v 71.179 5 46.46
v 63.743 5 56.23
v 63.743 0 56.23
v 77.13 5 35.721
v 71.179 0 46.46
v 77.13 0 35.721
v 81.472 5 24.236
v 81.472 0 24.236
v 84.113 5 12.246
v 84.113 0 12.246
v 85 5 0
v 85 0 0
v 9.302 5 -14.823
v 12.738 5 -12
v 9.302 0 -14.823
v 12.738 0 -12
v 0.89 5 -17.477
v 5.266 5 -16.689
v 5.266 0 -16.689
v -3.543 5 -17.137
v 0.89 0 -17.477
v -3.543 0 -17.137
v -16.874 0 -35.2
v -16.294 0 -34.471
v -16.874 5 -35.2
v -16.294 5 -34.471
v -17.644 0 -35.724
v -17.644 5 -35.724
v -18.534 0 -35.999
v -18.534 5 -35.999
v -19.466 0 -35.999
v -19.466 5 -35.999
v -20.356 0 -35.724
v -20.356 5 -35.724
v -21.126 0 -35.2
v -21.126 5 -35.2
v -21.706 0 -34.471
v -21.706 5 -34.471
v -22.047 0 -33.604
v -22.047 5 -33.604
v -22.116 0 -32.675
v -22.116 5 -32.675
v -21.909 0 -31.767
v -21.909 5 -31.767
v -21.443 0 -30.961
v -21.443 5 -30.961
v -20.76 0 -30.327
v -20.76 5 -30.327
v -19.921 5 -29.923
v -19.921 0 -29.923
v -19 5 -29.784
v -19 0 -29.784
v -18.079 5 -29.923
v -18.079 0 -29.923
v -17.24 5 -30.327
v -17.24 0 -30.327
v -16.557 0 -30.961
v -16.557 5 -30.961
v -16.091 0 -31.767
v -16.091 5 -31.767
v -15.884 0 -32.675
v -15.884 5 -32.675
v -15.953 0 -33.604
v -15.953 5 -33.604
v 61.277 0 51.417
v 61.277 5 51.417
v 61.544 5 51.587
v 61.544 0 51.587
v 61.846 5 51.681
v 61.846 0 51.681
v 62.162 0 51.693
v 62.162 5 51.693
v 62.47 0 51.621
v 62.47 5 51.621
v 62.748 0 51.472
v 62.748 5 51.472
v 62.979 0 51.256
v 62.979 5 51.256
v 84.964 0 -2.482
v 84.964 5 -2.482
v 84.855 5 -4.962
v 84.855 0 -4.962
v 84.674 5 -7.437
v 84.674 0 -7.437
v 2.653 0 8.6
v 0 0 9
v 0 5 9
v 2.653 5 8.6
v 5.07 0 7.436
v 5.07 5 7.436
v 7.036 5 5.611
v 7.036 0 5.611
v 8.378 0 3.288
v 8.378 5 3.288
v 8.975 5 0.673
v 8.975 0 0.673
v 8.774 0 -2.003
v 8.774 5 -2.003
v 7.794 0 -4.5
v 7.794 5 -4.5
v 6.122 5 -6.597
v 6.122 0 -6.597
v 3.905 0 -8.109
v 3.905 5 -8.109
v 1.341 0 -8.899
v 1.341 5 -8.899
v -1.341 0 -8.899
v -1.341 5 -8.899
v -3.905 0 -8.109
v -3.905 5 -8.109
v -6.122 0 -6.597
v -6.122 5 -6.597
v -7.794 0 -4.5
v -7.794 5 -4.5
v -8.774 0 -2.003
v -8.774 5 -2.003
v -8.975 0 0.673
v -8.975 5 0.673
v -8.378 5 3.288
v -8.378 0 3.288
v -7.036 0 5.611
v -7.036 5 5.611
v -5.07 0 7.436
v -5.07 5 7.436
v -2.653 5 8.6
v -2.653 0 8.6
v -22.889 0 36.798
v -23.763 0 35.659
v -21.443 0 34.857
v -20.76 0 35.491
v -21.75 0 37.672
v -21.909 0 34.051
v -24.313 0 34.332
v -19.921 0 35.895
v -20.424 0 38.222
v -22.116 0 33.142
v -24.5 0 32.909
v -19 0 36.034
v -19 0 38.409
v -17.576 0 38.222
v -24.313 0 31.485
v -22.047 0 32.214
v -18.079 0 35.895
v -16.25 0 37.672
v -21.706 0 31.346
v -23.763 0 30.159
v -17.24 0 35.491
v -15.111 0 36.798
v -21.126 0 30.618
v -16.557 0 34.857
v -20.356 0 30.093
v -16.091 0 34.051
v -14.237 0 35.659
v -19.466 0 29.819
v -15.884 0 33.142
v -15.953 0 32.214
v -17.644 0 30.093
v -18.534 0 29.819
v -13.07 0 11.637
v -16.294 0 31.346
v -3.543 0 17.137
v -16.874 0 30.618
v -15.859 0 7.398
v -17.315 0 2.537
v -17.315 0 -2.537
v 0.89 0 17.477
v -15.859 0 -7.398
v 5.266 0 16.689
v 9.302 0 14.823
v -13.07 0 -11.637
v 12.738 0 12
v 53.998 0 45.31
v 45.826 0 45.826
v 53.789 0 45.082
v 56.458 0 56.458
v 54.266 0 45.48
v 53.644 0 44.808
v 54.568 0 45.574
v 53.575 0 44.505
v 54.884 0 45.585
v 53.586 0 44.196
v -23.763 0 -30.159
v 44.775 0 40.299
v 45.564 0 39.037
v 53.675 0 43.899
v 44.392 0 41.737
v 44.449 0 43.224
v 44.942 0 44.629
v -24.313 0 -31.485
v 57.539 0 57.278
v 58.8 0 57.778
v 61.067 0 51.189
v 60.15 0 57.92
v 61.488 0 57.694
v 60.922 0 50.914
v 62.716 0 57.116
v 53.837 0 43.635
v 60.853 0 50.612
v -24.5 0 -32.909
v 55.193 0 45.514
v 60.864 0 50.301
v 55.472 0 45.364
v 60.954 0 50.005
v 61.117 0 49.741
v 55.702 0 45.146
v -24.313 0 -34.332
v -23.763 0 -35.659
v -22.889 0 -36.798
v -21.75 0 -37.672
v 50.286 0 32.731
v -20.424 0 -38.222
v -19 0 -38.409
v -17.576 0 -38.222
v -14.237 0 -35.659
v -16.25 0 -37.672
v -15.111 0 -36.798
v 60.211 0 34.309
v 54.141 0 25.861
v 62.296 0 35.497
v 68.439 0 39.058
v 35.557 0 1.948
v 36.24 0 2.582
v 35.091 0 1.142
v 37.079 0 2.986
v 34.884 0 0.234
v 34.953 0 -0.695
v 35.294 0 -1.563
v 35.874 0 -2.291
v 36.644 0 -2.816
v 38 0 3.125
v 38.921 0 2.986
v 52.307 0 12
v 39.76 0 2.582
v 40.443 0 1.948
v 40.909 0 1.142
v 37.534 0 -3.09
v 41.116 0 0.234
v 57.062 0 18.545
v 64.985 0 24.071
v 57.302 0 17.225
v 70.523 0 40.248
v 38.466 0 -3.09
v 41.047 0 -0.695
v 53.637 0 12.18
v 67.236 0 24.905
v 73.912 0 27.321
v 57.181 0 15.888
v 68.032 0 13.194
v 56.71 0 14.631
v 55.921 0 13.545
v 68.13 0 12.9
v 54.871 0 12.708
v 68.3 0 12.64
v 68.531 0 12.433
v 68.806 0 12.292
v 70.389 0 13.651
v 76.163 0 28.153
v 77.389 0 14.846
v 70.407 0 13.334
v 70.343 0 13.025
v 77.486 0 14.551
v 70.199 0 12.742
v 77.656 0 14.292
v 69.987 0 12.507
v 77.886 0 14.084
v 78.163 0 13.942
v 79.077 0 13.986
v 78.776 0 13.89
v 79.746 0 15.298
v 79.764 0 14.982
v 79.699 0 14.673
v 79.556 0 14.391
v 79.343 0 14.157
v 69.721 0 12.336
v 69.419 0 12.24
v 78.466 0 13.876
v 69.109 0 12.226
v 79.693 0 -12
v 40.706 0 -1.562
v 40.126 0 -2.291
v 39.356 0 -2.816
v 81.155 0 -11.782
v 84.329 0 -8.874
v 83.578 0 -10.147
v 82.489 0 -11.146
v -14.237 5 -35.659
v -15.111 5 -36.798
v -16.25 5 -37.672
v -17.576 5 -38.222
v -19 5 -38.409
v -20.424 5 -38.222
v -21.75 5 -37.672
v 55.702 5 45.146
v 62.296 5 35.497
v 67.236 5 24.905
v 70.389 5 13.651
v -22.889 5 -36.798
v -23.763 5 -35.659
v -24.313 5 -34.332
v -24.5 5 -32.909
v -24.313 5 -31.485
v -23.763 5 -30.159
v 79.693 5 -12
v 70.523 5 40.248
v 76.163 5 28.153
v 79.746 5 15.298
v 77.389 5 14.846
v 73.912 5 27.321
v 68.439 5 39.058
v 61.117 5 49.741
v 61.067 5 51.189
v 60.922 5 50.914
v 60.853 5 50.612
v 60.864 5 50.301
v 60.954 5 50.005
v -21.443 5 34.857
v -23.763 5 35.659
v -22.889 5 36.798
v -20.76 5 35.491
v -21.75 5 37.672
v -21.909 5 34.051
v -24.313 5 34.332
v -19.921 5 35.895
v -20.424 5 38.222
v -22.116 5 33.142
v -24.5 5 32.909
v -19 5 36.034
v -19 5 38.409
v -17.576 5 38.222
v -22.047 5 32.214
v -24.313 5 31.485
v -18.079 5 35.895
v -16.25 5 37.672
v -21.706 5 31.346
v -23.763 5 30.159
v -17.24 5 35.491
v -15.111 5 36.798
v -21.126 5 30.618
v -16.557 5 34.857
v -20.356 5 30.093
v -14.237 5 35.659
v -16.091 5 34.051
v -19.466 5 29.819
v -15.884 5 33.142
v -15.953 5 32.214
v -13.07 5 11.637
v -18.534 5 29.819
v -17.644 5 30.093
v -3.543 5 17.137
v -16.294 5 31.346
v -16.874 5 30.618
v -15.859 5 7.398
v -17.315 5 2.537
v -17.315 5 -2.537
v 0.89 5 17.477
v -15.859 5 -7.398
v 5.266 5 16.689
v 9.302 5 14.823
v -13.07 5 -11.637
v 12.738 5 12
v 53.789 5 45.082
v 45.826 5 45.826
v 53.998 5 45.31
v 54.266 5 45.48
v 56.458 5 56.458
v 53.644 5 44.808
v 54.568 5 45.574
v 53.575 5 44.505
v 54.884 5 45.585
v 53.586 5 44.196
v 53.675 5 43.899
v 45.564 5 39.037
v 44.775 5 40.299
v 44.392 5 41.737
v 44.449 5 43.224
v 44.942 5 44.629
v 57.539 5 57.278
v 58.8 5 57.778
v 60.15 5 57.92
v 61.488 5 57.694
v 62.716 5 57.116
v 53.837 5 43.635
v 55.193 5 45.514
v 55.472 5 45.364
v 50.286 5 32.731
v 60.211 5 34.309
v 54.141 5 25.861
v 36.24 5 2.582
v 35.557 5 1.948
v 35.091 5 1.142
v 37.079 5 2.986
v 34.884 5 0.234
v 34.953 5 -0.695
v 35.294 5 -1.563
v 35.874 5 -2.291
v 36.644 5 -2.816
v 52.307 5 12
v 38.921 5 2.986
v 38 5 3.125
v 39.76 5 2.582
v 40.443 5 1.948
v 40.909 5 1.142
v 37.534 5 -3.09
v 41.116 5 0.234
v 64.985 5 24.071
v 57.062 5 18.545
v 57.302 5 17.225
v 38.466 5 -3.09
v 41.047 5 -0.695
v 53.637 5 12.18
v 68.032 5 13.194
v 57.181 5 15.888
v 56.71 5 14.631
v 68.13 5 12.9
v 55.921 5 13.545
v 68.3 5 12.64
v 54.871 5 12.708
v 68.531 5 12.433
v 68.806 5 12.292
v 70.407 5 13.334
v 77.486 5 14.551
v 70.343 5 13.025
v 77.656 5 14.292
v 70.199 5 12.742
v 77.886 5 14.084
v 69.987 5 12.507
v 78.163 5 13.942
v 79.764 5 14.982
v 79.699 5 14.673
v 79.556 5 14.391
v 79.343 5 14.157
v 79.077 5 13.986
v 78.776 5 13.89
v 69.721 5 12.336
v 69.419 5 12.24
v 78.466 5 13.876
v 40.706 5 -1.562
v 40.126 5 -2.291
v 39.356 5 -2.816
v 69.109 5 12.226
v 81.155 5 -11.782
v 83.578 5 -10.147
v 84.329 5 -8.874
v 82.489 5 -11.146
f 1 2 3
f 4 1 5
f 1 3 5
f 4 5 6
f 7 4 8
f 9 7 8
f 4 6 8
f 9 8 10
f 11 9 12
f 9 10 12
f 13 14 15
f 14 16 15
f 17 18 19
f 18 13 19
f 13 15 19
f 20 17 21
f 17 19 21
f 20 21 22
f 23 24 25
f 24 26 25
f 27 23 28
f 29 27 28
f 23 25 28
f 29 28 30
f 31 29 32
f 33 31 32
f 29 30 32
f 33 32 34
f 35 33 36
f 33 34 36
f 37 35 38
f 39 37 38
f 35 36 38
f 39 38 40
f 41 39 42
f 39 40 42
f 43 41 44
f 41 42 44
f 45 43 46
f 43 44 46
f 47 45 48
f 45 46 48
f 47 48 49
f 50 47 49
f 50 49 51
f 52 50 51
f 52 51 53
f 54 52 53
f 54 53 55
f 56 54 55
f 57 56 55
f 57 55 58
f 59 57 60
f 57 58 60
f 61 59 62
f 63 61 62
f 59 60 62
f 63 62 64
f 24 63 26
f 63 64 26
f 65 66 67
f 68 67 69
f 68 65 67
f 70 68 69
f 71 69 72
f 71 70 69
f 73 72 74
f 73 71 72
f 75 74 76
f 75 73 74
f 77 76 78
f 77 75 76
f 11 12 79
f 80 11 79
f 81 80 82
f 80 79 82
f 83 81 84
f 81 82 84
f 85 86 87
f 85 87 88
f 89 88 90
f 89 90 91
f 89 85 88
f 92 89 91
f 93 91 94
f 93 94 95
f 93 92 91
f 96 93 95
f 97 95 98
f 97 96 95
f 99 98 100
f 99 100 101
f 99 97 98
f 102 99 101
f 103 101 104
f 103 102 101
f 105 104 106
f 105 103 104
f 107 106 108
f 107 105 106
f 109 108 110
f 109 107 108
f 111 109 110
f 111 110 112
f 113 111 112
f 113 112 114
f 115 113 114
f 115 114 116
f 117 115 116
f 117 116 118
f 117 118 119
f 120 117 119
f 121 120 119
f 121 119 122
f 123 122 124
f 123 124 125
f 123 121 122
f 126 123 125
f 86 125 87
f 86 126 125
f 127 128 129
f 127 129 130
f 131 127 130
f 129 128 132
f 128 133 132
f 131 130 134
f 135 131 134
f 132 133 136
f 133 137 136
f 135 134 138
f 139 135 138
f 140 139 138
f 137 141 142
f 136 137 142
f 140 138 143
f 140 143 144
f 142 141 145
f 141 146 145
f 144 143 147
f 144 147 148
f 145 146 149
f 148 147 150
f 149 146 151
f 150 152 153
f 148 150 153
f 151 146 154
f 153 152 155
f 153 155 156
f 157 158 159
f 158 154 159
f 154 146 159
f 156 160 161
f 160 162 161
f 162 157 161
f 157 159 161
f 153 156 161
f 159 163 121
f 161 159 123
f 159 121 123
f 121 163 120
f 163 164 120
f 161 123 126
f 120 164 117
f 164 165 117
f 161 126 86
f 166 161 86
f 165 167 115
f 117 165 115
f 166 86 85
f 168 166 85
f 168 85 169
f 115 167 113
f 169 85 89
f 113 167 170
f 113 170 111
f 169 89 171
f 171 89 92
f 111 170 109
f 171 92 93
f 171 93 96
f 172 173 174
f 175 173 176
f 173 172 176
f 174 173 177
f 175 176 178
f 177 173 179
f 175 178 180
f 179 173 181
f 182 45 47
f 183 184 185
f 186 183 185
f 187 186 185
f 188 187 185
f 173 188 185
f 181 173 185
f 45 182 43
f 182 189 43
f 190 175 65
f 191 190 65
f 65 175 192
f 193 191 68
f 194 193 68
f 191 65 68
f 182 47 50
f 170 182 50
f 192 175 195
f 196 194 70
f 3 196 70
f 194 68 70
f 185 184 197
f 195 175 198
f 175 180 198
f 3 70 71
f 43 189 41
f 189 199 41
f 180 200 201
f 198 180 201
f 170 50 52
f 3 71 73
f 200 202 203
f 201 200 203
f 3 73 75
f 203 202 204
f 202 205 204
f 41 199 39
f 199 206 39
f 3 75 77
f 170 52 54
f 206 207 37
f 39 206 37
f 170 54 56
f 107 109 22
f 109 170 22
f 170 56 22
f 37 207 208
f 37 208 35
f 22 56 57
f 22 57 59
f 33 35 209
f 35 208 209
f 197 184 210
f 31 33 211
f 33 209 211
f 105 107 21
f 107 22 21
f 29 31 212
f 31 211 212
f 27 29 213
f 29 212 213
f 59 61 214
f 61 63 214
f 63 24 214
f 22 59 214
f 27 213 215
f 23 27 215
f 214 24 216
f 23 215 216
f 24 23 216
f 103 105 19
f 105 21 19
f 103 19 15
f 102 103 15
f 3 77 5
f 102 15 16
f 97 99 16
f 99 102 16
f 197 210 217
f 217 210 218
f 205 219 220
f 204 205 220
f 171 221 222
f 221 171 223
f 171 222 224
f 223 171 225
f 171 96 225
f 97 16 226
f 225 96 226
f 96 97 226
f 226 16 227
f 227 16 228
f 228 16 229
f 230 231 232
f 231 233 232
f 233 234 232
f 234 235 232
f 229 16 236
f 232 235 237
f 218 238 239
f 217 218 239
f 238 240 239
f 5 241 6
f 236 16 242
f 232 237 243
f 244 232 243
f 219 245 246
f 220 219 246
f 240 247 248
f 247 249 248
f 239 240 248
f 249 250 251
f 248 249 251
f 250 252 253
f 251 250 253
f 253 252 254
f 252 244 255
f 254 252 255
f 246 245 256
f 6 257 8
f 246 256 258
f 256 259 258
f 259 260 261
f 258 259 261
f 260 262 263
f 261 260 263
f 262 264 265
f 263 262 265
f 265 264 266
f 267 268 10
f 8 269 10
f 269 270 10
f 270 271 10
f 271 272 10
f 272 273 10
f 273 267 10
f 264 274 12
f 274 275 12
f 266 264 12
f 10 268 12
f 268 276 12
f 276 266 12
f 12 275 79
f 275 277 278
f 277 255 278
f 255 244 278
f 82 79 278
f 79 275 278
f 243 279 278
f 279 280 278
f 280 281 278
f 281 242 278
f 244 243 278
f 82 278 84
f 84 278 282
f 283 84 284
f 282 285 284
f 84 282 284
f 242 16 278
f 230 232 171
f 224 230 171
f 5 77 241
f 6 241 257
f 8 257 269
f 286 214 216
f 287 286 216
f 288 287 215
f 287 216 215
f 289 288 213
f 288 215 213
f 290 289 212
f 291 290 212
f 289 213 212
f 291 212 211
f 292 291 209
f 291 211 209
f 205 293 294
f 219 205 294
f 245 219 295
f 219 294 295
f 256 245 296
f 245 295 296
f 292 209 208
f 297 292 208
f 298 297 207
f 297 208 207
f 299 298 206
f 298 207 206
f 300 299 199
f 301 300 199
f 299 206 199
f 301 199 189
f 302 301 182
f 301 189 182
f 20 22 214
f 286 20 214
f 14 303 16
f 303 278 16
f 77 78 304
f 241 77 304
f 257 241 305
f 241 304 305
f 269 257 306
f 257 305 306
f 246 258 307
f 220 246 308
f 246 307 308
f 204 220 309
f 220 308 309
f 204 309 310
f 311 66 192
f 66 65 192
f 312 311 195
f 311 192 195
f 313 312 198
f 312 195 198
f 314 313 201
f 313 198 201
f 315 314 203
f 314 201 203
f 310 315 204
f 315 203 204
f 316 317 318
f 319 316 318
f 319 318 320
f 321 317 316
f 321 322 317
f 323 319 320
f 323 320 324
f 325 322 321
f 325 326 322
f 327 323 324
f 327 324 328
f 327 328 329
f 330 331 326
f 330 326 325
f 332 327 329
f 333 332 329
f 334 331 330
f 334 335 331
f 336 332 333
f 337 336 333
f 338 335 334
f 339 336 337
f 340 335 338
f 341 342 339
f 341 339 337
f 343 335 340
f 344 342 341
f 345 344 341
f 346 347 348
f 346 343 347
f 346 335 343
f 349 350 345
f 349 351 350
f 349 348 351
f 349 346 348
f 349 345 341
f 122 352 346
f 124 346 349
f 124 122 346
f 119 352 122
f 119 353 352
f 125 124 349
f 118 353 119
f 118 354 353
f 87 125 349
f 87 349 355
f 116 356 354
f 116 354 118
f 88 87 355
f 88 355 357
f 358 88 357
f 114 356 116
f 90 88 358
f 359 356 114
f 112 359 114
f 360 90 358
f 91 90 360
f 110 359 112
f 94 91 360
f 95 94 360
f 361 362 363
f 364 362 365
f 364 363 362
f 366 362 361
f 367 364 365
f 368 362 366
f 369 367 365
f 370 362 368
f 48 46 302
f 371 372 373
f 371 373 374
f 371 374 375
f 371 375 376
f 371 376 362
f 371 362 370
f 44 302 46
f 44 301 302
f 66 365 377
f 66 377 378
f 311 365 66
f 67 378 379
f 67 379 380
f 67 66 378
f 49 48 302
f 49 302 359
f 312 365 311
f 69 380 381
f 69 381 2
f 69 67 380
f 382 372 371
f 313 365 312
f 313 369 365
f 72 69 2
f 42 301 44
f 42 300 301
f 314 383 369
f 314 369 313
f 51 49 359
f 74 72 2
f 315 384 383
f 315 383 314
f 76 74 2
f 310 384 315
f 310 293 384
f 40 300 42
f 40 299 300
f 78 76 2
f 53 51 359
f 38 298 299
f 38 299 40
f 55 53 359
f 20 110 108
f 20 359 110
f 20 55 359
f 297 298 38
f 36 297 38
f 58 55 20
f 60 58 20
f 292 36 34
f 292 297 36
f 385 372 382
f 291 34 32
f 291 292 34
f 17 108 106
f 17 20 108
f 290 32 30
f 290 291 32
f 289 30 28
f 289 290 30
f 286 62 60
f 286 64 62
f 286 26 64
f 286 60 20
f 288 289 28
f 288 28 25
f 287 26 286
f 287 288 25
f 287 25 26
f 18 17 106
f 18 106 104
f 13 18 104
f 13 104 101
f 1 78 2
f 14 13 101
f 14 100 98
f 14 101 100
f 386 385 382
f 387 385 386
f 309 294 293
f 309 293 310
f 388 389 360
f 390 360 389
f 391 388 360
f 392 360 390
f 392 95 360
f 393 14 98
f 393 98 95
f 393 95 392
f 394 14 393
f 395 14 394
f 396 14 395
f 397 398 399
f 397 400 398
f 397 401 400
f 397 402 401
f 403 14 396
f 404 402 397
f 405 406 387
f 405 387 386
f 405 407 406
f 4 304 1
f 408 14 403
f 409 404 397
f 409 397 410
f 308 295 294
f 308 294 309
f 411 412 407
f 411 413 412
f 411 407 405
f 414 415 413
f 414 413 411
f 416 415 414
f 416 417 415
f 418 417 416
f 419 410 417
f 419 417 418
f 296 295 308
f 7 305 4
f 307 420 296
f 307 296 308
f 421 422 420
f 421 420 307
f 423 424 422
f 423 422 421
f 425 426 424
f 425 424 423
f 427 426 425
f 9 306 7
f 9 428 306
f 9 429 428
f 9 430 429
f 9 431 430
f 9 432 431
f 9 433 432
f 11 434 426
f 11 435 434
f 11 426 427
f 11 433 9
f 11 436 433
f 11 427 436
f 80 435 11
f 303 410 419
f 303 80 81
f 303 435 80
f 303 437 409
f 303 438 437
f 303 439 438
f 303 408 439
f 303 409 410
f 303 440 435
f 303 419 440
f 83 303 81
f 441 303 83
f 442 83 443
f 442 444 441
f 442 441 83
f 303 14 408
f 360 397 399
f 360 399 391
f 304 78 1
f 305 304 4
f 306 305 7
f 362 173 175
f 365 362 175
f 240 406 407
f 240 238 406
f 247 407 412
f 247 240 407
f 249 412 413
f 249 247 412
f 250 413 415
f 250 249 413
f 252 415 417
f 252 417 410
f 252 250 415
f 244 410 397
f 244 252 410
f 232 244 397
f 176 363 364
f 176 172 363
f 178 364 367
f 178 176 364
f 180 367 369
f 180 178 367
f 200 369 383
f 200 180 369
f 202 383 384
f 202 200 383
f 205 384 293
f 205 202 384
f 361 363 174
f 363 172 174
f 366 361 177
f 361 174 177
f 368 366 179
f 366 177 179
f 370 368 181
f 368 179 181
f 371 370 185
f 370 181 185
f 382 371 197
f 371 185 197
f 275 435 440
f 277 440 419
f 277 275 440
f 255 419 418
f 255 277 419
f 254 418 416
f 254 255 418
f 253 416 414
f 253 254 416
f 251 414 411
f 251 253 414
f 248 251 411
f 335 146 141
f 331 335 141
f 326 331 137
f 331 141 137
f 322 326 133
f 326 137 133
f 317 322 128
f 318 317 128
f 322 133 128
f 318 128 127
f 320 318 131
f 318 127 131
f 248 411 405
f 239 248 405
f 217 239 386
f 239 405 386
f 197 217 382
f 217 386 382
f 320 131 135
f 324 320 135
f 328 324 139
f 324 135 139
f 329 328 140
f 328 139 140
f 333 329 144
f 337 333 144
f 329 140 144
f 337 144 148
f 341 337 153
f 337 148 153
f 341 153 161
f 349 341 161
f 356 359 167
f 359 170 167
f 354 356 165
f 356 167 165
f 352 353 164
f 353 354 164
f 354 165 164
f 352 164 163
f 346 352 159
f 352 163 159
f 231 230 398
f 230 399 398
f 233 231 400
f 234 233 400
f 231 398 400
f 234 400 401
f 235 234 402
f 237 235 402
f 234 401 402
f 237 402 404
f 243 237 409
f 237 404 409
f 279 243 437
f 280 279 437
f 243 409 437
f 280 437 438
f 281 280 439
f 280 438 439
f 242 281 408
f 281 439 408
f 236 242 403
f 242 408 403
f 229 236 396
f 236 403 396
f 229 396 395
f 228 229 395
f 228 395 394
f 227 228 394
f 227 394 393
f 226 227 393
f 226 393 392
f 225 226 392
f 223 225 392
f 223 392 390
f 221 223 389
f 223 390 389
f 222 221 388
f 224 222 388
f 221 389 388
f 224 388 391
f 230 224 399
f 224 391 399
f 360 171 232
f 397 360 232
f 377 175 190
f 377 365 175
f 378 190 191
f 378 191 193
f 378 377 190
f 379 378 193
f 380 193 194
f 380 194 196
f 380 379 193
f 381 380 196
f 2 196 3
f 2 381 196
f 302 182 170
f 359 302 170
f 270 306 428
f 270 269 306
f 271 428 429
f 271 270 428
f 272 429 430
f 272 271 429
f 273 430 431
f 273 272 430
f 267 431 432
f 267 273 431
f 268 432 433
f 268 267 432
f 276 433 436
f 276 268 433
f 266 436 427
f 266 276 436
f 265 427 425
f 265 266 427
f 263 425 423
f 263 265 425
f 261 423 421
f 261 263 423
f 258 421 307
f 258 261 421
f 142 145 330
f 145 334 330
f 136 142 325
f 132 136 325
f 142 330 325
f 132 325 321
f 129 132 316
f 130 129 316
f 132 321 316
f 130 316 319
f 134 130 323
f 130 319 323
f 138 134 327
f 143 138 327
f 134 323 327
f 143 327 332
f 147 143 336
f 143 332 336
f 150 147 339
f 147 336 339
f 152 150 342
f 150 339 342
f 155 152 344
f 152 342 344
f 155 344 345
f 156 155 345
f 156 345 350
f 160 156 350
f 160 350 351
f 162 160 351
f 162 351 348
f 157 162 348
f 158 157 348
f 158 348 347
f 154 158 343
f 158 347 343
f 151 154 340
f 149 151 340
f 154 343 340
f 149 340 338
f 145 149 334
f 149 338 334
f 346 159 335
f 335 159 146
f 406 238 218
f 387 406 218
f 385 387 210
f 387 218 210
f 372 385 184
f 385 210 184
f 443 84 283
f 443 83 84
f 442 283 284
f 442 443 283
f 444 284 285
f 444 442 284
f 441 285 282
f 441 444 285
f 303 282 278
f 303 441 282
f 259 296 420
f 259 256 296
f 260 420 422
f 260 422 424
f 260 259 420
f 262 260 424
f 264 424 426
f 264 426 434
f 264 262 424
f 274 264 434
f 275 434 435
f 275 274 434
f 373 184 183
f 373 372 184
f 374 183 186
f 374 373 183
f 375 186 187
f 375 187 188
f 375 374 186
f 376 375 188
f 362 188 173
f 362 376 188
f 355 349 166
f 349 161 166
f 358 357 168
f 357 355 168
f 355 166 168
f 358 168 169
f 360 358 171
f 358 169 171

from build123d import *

# Parameters (mm, degrees)
SKETCH1_R               = 17.5
SKETCH1_R_2             = 9
BOSS_EXTRUDE1_DEPTH     = 5
BOSS_EXTRUDE3_DEPTH     = 5
SKETCH6_W               = 47.262260797
SKETCH6_H               = 24
BOSS_EXTRUDE4_DEPTH     = 5
SKETCH4_R               = 3.125
CUT_EXTRUDE1_DEPTH      = 63.69968102
CIRPATTERN1_COUNT       = 3
BOSS_EXTRUDE5_DEPTH     = 5
CUT_EXTRUDE_THIN1_DEPTH = 10
FILLET1_R               = 1.2
FILLET2_R               = 5


with BuildPart() as part:
    # Sketch1 → Boss-Extrude1 (new body)
    with BuildSketch(Plane(origin=(0, 0, 0), x_dir=(1, 0, 0), z_dir=(0, 1, 0))):
        with Locations(Location((0, 0, 0), (0, 0, 270))):
            Circle(SKETCH1_R)
        with Locations(Location((0, 0, 0), (0, 0, 270))):
            Circle(SKETCH1_R_2, mode=Mode.SUBTRACT)
    extrude(amount=BOSS_EXTRUDE1_DEPTH)

    # Sketch3 → Boss-Extrude3 (add)
    with BuildSketch(Plane(origin=(0, 0, 0), x_dir=(1, 0, 0), z_dir=(0, 1, 0))):
        with BuildLine():
            Line((38, 5.5), (10.009906254, 5.5))
            Line((10.009906254, 5.5), (10.009906254, -5.5))
            Line((10.009906254, -5.5), (38, -5.5))
            ThreePointArc((38, -5.5), (32.5, 0), (38, 5.5))
        make_face()
        with BuildLine():
            ThreePointArc((43.5, 0), (41.889087297, 3.889087297), (38, 5.5))
            Line((38, 5.5), (38, -5.5))
            ThreePointArc((38, -5.5), (41.889087297, -3.889087297), (43.5, 0))
        make_face()
        with BuildLine():
            Line((38, -5.5), (38, 5.5))
            ThreePointArc((38, 5.5), (32.5, 0), (38, -5.5))
        make_face()
    boss_extrude3 = extrude(amount=BOSS_EXTRUDE3_DEPTH)

    # Sketch6 → Boss-Extrude4 (add)
    with BuildSketch(Plane(origin=(0, 0, 0), x_dir=(1, 0, 0), z_dir=(0, 1, 0))):
        with Locations((36.368869602, 0)):
            Rectangle(SKETCH6_W, SKETCH6_H)
    extrude(amount=BOSS_EXTRUDE4_DEPTH)

    # Sketch4 → Cut-Extrude1 (cut, symmetric)
    with BuildSketch(Plane(origin=(0, 5, 0), x_dir=(1, 0, 0), z_dir=(0, 1, 0))):
        with Locations(Location((38, 0, 0), (0, 0, 270))):
            Circle(SKETCH4_R)
    cut_extrude1 = extrude(amount=CUT_EXTRUDE1_DEPTH, both=True, mode=Mode.SUBTRACT)

    # CirPattern1: Boss-Extrude3, Cut-Extrude1 ×3 about axis
    cirpattern1_axis = Axis((0, 0, 0), (0, 1, 0))
    add([boss_extrude3.rotate(cirpattern1_axis, i * 360 / CIRPATTERN1_COUNT) for i in range(1, CIRPATTERN1_COUNT)])
    add([cut_extrude1.rotate(cirpattern1_axis, i * 360 / CIRPATTERN1_COUNT) for i in range(1, CIRPATTERN1_COUNT)], mode=Mode.SUBTRACT)

    # Sketch7 → Boss-Extrude5 (add)
    with BuildSketch(Plane(origin=(0, 0, 0), x_dir=(1, 0, 0), z_dir=(0, 1, 0))):
        with BuildLine():
            Line((42.426406871, -42.426406871), (60.104076401, -60.104076401))
            ThreePointArc((60.104076401, -60.104076401), (78.529760263, -32.528091751), (85, 0))
            ThreePointArc((85, 0), (84.786902365, 6.015079992), (84.148677946, 12))
            Line((84.148677946, 12), (58.787753827, 12))
            ThreePointArc((58.787753827, 12), (59.69616918, 6.03053772), (60, 0))
            ThreePointArc((60, 0), (55.432771951, -22.961005942), (42.426406871, -42.426406871))
        make_face()
    extrude(amount=BOSS_EXTRUDE5_DEPTH)

    # Sketch8 → Cut-Extrude-Thin1 (cut)
    with BuildSketch(Plane(origin=(0, 5, 0), x_dir=(1, 0, 0), z_dir=(0, 1, 0))):
        with BuildLine():
            ThreePointArc((77.602850937, -13.6834764), (71.417053618, -33.302319025), (60.364302118, -50.651663643))
            Line((60.364302118, -50.651663643), (62.202808781, -52.194353907))
            ThreePointArc((62.202808781, -52.194353907), (73.592192307, -34.316602853), (79.966389545, -14.100232027))
            Line((79.966389545, -14.100232027), (77.602850937, -13.6834764))
        make_face()
        with BuildLine():
            ThreePointArc((68.247177284, -12.033818712), (62.807129642, -29.287445539), (53.086879908, -44.545181351))
            Line((53.086879908, -44.545181351), (54.925386572, -46.087871615))
            ThreePointArc((54.925386572, -46.087871615), (64.982268331, -30.301729367), (70.610715891, -12.450574339))
            Line((70.610715891, -12.450574339), (68.247177284, -12.033818712))
        make_face()
    extrude(amount=-CUT_EXTRUDE_THIN1_DEPTH, mode=Mode.SUBTRACT)

    # Fillet1
    fillet1_edges = [part.edges().sort_by_distance(p)[0] for p in [
        (70.610715891, 2.5, 12.450574339),
        (79.966389545, 2.5, 14.100232027),
        (77.602850937, 2.5, 13.6834764),
        (68.247177284, 2.5, 12.033818712),
        (62.202808781, 2.5, 52.194353907),
        (60.364302118, 2.5, 50.651663643),
        (54.925386572, 2.5, 46.087871615),
        (53.086879908, 2.5, 44.545181351),
    ]]
    fillet(fillet1_edges, radius=FILLET1_R - 0.0001)  # a hair under: the kernel refuses the full size

    # Fillet2
    fillet2_edges = [part.edges().sort_by_distance(p)[0] for p in [
        (84.148677946, 2.5, -12),
        (58.787753827, 2.5, 12),
        (42.426406871, 2.5, 42.426406871),
        (60.104076401, 2.5, 60.104076401),
    ]]
    fillet(fillet2_edges, radius=FILLET2_R)


solid = part.part
